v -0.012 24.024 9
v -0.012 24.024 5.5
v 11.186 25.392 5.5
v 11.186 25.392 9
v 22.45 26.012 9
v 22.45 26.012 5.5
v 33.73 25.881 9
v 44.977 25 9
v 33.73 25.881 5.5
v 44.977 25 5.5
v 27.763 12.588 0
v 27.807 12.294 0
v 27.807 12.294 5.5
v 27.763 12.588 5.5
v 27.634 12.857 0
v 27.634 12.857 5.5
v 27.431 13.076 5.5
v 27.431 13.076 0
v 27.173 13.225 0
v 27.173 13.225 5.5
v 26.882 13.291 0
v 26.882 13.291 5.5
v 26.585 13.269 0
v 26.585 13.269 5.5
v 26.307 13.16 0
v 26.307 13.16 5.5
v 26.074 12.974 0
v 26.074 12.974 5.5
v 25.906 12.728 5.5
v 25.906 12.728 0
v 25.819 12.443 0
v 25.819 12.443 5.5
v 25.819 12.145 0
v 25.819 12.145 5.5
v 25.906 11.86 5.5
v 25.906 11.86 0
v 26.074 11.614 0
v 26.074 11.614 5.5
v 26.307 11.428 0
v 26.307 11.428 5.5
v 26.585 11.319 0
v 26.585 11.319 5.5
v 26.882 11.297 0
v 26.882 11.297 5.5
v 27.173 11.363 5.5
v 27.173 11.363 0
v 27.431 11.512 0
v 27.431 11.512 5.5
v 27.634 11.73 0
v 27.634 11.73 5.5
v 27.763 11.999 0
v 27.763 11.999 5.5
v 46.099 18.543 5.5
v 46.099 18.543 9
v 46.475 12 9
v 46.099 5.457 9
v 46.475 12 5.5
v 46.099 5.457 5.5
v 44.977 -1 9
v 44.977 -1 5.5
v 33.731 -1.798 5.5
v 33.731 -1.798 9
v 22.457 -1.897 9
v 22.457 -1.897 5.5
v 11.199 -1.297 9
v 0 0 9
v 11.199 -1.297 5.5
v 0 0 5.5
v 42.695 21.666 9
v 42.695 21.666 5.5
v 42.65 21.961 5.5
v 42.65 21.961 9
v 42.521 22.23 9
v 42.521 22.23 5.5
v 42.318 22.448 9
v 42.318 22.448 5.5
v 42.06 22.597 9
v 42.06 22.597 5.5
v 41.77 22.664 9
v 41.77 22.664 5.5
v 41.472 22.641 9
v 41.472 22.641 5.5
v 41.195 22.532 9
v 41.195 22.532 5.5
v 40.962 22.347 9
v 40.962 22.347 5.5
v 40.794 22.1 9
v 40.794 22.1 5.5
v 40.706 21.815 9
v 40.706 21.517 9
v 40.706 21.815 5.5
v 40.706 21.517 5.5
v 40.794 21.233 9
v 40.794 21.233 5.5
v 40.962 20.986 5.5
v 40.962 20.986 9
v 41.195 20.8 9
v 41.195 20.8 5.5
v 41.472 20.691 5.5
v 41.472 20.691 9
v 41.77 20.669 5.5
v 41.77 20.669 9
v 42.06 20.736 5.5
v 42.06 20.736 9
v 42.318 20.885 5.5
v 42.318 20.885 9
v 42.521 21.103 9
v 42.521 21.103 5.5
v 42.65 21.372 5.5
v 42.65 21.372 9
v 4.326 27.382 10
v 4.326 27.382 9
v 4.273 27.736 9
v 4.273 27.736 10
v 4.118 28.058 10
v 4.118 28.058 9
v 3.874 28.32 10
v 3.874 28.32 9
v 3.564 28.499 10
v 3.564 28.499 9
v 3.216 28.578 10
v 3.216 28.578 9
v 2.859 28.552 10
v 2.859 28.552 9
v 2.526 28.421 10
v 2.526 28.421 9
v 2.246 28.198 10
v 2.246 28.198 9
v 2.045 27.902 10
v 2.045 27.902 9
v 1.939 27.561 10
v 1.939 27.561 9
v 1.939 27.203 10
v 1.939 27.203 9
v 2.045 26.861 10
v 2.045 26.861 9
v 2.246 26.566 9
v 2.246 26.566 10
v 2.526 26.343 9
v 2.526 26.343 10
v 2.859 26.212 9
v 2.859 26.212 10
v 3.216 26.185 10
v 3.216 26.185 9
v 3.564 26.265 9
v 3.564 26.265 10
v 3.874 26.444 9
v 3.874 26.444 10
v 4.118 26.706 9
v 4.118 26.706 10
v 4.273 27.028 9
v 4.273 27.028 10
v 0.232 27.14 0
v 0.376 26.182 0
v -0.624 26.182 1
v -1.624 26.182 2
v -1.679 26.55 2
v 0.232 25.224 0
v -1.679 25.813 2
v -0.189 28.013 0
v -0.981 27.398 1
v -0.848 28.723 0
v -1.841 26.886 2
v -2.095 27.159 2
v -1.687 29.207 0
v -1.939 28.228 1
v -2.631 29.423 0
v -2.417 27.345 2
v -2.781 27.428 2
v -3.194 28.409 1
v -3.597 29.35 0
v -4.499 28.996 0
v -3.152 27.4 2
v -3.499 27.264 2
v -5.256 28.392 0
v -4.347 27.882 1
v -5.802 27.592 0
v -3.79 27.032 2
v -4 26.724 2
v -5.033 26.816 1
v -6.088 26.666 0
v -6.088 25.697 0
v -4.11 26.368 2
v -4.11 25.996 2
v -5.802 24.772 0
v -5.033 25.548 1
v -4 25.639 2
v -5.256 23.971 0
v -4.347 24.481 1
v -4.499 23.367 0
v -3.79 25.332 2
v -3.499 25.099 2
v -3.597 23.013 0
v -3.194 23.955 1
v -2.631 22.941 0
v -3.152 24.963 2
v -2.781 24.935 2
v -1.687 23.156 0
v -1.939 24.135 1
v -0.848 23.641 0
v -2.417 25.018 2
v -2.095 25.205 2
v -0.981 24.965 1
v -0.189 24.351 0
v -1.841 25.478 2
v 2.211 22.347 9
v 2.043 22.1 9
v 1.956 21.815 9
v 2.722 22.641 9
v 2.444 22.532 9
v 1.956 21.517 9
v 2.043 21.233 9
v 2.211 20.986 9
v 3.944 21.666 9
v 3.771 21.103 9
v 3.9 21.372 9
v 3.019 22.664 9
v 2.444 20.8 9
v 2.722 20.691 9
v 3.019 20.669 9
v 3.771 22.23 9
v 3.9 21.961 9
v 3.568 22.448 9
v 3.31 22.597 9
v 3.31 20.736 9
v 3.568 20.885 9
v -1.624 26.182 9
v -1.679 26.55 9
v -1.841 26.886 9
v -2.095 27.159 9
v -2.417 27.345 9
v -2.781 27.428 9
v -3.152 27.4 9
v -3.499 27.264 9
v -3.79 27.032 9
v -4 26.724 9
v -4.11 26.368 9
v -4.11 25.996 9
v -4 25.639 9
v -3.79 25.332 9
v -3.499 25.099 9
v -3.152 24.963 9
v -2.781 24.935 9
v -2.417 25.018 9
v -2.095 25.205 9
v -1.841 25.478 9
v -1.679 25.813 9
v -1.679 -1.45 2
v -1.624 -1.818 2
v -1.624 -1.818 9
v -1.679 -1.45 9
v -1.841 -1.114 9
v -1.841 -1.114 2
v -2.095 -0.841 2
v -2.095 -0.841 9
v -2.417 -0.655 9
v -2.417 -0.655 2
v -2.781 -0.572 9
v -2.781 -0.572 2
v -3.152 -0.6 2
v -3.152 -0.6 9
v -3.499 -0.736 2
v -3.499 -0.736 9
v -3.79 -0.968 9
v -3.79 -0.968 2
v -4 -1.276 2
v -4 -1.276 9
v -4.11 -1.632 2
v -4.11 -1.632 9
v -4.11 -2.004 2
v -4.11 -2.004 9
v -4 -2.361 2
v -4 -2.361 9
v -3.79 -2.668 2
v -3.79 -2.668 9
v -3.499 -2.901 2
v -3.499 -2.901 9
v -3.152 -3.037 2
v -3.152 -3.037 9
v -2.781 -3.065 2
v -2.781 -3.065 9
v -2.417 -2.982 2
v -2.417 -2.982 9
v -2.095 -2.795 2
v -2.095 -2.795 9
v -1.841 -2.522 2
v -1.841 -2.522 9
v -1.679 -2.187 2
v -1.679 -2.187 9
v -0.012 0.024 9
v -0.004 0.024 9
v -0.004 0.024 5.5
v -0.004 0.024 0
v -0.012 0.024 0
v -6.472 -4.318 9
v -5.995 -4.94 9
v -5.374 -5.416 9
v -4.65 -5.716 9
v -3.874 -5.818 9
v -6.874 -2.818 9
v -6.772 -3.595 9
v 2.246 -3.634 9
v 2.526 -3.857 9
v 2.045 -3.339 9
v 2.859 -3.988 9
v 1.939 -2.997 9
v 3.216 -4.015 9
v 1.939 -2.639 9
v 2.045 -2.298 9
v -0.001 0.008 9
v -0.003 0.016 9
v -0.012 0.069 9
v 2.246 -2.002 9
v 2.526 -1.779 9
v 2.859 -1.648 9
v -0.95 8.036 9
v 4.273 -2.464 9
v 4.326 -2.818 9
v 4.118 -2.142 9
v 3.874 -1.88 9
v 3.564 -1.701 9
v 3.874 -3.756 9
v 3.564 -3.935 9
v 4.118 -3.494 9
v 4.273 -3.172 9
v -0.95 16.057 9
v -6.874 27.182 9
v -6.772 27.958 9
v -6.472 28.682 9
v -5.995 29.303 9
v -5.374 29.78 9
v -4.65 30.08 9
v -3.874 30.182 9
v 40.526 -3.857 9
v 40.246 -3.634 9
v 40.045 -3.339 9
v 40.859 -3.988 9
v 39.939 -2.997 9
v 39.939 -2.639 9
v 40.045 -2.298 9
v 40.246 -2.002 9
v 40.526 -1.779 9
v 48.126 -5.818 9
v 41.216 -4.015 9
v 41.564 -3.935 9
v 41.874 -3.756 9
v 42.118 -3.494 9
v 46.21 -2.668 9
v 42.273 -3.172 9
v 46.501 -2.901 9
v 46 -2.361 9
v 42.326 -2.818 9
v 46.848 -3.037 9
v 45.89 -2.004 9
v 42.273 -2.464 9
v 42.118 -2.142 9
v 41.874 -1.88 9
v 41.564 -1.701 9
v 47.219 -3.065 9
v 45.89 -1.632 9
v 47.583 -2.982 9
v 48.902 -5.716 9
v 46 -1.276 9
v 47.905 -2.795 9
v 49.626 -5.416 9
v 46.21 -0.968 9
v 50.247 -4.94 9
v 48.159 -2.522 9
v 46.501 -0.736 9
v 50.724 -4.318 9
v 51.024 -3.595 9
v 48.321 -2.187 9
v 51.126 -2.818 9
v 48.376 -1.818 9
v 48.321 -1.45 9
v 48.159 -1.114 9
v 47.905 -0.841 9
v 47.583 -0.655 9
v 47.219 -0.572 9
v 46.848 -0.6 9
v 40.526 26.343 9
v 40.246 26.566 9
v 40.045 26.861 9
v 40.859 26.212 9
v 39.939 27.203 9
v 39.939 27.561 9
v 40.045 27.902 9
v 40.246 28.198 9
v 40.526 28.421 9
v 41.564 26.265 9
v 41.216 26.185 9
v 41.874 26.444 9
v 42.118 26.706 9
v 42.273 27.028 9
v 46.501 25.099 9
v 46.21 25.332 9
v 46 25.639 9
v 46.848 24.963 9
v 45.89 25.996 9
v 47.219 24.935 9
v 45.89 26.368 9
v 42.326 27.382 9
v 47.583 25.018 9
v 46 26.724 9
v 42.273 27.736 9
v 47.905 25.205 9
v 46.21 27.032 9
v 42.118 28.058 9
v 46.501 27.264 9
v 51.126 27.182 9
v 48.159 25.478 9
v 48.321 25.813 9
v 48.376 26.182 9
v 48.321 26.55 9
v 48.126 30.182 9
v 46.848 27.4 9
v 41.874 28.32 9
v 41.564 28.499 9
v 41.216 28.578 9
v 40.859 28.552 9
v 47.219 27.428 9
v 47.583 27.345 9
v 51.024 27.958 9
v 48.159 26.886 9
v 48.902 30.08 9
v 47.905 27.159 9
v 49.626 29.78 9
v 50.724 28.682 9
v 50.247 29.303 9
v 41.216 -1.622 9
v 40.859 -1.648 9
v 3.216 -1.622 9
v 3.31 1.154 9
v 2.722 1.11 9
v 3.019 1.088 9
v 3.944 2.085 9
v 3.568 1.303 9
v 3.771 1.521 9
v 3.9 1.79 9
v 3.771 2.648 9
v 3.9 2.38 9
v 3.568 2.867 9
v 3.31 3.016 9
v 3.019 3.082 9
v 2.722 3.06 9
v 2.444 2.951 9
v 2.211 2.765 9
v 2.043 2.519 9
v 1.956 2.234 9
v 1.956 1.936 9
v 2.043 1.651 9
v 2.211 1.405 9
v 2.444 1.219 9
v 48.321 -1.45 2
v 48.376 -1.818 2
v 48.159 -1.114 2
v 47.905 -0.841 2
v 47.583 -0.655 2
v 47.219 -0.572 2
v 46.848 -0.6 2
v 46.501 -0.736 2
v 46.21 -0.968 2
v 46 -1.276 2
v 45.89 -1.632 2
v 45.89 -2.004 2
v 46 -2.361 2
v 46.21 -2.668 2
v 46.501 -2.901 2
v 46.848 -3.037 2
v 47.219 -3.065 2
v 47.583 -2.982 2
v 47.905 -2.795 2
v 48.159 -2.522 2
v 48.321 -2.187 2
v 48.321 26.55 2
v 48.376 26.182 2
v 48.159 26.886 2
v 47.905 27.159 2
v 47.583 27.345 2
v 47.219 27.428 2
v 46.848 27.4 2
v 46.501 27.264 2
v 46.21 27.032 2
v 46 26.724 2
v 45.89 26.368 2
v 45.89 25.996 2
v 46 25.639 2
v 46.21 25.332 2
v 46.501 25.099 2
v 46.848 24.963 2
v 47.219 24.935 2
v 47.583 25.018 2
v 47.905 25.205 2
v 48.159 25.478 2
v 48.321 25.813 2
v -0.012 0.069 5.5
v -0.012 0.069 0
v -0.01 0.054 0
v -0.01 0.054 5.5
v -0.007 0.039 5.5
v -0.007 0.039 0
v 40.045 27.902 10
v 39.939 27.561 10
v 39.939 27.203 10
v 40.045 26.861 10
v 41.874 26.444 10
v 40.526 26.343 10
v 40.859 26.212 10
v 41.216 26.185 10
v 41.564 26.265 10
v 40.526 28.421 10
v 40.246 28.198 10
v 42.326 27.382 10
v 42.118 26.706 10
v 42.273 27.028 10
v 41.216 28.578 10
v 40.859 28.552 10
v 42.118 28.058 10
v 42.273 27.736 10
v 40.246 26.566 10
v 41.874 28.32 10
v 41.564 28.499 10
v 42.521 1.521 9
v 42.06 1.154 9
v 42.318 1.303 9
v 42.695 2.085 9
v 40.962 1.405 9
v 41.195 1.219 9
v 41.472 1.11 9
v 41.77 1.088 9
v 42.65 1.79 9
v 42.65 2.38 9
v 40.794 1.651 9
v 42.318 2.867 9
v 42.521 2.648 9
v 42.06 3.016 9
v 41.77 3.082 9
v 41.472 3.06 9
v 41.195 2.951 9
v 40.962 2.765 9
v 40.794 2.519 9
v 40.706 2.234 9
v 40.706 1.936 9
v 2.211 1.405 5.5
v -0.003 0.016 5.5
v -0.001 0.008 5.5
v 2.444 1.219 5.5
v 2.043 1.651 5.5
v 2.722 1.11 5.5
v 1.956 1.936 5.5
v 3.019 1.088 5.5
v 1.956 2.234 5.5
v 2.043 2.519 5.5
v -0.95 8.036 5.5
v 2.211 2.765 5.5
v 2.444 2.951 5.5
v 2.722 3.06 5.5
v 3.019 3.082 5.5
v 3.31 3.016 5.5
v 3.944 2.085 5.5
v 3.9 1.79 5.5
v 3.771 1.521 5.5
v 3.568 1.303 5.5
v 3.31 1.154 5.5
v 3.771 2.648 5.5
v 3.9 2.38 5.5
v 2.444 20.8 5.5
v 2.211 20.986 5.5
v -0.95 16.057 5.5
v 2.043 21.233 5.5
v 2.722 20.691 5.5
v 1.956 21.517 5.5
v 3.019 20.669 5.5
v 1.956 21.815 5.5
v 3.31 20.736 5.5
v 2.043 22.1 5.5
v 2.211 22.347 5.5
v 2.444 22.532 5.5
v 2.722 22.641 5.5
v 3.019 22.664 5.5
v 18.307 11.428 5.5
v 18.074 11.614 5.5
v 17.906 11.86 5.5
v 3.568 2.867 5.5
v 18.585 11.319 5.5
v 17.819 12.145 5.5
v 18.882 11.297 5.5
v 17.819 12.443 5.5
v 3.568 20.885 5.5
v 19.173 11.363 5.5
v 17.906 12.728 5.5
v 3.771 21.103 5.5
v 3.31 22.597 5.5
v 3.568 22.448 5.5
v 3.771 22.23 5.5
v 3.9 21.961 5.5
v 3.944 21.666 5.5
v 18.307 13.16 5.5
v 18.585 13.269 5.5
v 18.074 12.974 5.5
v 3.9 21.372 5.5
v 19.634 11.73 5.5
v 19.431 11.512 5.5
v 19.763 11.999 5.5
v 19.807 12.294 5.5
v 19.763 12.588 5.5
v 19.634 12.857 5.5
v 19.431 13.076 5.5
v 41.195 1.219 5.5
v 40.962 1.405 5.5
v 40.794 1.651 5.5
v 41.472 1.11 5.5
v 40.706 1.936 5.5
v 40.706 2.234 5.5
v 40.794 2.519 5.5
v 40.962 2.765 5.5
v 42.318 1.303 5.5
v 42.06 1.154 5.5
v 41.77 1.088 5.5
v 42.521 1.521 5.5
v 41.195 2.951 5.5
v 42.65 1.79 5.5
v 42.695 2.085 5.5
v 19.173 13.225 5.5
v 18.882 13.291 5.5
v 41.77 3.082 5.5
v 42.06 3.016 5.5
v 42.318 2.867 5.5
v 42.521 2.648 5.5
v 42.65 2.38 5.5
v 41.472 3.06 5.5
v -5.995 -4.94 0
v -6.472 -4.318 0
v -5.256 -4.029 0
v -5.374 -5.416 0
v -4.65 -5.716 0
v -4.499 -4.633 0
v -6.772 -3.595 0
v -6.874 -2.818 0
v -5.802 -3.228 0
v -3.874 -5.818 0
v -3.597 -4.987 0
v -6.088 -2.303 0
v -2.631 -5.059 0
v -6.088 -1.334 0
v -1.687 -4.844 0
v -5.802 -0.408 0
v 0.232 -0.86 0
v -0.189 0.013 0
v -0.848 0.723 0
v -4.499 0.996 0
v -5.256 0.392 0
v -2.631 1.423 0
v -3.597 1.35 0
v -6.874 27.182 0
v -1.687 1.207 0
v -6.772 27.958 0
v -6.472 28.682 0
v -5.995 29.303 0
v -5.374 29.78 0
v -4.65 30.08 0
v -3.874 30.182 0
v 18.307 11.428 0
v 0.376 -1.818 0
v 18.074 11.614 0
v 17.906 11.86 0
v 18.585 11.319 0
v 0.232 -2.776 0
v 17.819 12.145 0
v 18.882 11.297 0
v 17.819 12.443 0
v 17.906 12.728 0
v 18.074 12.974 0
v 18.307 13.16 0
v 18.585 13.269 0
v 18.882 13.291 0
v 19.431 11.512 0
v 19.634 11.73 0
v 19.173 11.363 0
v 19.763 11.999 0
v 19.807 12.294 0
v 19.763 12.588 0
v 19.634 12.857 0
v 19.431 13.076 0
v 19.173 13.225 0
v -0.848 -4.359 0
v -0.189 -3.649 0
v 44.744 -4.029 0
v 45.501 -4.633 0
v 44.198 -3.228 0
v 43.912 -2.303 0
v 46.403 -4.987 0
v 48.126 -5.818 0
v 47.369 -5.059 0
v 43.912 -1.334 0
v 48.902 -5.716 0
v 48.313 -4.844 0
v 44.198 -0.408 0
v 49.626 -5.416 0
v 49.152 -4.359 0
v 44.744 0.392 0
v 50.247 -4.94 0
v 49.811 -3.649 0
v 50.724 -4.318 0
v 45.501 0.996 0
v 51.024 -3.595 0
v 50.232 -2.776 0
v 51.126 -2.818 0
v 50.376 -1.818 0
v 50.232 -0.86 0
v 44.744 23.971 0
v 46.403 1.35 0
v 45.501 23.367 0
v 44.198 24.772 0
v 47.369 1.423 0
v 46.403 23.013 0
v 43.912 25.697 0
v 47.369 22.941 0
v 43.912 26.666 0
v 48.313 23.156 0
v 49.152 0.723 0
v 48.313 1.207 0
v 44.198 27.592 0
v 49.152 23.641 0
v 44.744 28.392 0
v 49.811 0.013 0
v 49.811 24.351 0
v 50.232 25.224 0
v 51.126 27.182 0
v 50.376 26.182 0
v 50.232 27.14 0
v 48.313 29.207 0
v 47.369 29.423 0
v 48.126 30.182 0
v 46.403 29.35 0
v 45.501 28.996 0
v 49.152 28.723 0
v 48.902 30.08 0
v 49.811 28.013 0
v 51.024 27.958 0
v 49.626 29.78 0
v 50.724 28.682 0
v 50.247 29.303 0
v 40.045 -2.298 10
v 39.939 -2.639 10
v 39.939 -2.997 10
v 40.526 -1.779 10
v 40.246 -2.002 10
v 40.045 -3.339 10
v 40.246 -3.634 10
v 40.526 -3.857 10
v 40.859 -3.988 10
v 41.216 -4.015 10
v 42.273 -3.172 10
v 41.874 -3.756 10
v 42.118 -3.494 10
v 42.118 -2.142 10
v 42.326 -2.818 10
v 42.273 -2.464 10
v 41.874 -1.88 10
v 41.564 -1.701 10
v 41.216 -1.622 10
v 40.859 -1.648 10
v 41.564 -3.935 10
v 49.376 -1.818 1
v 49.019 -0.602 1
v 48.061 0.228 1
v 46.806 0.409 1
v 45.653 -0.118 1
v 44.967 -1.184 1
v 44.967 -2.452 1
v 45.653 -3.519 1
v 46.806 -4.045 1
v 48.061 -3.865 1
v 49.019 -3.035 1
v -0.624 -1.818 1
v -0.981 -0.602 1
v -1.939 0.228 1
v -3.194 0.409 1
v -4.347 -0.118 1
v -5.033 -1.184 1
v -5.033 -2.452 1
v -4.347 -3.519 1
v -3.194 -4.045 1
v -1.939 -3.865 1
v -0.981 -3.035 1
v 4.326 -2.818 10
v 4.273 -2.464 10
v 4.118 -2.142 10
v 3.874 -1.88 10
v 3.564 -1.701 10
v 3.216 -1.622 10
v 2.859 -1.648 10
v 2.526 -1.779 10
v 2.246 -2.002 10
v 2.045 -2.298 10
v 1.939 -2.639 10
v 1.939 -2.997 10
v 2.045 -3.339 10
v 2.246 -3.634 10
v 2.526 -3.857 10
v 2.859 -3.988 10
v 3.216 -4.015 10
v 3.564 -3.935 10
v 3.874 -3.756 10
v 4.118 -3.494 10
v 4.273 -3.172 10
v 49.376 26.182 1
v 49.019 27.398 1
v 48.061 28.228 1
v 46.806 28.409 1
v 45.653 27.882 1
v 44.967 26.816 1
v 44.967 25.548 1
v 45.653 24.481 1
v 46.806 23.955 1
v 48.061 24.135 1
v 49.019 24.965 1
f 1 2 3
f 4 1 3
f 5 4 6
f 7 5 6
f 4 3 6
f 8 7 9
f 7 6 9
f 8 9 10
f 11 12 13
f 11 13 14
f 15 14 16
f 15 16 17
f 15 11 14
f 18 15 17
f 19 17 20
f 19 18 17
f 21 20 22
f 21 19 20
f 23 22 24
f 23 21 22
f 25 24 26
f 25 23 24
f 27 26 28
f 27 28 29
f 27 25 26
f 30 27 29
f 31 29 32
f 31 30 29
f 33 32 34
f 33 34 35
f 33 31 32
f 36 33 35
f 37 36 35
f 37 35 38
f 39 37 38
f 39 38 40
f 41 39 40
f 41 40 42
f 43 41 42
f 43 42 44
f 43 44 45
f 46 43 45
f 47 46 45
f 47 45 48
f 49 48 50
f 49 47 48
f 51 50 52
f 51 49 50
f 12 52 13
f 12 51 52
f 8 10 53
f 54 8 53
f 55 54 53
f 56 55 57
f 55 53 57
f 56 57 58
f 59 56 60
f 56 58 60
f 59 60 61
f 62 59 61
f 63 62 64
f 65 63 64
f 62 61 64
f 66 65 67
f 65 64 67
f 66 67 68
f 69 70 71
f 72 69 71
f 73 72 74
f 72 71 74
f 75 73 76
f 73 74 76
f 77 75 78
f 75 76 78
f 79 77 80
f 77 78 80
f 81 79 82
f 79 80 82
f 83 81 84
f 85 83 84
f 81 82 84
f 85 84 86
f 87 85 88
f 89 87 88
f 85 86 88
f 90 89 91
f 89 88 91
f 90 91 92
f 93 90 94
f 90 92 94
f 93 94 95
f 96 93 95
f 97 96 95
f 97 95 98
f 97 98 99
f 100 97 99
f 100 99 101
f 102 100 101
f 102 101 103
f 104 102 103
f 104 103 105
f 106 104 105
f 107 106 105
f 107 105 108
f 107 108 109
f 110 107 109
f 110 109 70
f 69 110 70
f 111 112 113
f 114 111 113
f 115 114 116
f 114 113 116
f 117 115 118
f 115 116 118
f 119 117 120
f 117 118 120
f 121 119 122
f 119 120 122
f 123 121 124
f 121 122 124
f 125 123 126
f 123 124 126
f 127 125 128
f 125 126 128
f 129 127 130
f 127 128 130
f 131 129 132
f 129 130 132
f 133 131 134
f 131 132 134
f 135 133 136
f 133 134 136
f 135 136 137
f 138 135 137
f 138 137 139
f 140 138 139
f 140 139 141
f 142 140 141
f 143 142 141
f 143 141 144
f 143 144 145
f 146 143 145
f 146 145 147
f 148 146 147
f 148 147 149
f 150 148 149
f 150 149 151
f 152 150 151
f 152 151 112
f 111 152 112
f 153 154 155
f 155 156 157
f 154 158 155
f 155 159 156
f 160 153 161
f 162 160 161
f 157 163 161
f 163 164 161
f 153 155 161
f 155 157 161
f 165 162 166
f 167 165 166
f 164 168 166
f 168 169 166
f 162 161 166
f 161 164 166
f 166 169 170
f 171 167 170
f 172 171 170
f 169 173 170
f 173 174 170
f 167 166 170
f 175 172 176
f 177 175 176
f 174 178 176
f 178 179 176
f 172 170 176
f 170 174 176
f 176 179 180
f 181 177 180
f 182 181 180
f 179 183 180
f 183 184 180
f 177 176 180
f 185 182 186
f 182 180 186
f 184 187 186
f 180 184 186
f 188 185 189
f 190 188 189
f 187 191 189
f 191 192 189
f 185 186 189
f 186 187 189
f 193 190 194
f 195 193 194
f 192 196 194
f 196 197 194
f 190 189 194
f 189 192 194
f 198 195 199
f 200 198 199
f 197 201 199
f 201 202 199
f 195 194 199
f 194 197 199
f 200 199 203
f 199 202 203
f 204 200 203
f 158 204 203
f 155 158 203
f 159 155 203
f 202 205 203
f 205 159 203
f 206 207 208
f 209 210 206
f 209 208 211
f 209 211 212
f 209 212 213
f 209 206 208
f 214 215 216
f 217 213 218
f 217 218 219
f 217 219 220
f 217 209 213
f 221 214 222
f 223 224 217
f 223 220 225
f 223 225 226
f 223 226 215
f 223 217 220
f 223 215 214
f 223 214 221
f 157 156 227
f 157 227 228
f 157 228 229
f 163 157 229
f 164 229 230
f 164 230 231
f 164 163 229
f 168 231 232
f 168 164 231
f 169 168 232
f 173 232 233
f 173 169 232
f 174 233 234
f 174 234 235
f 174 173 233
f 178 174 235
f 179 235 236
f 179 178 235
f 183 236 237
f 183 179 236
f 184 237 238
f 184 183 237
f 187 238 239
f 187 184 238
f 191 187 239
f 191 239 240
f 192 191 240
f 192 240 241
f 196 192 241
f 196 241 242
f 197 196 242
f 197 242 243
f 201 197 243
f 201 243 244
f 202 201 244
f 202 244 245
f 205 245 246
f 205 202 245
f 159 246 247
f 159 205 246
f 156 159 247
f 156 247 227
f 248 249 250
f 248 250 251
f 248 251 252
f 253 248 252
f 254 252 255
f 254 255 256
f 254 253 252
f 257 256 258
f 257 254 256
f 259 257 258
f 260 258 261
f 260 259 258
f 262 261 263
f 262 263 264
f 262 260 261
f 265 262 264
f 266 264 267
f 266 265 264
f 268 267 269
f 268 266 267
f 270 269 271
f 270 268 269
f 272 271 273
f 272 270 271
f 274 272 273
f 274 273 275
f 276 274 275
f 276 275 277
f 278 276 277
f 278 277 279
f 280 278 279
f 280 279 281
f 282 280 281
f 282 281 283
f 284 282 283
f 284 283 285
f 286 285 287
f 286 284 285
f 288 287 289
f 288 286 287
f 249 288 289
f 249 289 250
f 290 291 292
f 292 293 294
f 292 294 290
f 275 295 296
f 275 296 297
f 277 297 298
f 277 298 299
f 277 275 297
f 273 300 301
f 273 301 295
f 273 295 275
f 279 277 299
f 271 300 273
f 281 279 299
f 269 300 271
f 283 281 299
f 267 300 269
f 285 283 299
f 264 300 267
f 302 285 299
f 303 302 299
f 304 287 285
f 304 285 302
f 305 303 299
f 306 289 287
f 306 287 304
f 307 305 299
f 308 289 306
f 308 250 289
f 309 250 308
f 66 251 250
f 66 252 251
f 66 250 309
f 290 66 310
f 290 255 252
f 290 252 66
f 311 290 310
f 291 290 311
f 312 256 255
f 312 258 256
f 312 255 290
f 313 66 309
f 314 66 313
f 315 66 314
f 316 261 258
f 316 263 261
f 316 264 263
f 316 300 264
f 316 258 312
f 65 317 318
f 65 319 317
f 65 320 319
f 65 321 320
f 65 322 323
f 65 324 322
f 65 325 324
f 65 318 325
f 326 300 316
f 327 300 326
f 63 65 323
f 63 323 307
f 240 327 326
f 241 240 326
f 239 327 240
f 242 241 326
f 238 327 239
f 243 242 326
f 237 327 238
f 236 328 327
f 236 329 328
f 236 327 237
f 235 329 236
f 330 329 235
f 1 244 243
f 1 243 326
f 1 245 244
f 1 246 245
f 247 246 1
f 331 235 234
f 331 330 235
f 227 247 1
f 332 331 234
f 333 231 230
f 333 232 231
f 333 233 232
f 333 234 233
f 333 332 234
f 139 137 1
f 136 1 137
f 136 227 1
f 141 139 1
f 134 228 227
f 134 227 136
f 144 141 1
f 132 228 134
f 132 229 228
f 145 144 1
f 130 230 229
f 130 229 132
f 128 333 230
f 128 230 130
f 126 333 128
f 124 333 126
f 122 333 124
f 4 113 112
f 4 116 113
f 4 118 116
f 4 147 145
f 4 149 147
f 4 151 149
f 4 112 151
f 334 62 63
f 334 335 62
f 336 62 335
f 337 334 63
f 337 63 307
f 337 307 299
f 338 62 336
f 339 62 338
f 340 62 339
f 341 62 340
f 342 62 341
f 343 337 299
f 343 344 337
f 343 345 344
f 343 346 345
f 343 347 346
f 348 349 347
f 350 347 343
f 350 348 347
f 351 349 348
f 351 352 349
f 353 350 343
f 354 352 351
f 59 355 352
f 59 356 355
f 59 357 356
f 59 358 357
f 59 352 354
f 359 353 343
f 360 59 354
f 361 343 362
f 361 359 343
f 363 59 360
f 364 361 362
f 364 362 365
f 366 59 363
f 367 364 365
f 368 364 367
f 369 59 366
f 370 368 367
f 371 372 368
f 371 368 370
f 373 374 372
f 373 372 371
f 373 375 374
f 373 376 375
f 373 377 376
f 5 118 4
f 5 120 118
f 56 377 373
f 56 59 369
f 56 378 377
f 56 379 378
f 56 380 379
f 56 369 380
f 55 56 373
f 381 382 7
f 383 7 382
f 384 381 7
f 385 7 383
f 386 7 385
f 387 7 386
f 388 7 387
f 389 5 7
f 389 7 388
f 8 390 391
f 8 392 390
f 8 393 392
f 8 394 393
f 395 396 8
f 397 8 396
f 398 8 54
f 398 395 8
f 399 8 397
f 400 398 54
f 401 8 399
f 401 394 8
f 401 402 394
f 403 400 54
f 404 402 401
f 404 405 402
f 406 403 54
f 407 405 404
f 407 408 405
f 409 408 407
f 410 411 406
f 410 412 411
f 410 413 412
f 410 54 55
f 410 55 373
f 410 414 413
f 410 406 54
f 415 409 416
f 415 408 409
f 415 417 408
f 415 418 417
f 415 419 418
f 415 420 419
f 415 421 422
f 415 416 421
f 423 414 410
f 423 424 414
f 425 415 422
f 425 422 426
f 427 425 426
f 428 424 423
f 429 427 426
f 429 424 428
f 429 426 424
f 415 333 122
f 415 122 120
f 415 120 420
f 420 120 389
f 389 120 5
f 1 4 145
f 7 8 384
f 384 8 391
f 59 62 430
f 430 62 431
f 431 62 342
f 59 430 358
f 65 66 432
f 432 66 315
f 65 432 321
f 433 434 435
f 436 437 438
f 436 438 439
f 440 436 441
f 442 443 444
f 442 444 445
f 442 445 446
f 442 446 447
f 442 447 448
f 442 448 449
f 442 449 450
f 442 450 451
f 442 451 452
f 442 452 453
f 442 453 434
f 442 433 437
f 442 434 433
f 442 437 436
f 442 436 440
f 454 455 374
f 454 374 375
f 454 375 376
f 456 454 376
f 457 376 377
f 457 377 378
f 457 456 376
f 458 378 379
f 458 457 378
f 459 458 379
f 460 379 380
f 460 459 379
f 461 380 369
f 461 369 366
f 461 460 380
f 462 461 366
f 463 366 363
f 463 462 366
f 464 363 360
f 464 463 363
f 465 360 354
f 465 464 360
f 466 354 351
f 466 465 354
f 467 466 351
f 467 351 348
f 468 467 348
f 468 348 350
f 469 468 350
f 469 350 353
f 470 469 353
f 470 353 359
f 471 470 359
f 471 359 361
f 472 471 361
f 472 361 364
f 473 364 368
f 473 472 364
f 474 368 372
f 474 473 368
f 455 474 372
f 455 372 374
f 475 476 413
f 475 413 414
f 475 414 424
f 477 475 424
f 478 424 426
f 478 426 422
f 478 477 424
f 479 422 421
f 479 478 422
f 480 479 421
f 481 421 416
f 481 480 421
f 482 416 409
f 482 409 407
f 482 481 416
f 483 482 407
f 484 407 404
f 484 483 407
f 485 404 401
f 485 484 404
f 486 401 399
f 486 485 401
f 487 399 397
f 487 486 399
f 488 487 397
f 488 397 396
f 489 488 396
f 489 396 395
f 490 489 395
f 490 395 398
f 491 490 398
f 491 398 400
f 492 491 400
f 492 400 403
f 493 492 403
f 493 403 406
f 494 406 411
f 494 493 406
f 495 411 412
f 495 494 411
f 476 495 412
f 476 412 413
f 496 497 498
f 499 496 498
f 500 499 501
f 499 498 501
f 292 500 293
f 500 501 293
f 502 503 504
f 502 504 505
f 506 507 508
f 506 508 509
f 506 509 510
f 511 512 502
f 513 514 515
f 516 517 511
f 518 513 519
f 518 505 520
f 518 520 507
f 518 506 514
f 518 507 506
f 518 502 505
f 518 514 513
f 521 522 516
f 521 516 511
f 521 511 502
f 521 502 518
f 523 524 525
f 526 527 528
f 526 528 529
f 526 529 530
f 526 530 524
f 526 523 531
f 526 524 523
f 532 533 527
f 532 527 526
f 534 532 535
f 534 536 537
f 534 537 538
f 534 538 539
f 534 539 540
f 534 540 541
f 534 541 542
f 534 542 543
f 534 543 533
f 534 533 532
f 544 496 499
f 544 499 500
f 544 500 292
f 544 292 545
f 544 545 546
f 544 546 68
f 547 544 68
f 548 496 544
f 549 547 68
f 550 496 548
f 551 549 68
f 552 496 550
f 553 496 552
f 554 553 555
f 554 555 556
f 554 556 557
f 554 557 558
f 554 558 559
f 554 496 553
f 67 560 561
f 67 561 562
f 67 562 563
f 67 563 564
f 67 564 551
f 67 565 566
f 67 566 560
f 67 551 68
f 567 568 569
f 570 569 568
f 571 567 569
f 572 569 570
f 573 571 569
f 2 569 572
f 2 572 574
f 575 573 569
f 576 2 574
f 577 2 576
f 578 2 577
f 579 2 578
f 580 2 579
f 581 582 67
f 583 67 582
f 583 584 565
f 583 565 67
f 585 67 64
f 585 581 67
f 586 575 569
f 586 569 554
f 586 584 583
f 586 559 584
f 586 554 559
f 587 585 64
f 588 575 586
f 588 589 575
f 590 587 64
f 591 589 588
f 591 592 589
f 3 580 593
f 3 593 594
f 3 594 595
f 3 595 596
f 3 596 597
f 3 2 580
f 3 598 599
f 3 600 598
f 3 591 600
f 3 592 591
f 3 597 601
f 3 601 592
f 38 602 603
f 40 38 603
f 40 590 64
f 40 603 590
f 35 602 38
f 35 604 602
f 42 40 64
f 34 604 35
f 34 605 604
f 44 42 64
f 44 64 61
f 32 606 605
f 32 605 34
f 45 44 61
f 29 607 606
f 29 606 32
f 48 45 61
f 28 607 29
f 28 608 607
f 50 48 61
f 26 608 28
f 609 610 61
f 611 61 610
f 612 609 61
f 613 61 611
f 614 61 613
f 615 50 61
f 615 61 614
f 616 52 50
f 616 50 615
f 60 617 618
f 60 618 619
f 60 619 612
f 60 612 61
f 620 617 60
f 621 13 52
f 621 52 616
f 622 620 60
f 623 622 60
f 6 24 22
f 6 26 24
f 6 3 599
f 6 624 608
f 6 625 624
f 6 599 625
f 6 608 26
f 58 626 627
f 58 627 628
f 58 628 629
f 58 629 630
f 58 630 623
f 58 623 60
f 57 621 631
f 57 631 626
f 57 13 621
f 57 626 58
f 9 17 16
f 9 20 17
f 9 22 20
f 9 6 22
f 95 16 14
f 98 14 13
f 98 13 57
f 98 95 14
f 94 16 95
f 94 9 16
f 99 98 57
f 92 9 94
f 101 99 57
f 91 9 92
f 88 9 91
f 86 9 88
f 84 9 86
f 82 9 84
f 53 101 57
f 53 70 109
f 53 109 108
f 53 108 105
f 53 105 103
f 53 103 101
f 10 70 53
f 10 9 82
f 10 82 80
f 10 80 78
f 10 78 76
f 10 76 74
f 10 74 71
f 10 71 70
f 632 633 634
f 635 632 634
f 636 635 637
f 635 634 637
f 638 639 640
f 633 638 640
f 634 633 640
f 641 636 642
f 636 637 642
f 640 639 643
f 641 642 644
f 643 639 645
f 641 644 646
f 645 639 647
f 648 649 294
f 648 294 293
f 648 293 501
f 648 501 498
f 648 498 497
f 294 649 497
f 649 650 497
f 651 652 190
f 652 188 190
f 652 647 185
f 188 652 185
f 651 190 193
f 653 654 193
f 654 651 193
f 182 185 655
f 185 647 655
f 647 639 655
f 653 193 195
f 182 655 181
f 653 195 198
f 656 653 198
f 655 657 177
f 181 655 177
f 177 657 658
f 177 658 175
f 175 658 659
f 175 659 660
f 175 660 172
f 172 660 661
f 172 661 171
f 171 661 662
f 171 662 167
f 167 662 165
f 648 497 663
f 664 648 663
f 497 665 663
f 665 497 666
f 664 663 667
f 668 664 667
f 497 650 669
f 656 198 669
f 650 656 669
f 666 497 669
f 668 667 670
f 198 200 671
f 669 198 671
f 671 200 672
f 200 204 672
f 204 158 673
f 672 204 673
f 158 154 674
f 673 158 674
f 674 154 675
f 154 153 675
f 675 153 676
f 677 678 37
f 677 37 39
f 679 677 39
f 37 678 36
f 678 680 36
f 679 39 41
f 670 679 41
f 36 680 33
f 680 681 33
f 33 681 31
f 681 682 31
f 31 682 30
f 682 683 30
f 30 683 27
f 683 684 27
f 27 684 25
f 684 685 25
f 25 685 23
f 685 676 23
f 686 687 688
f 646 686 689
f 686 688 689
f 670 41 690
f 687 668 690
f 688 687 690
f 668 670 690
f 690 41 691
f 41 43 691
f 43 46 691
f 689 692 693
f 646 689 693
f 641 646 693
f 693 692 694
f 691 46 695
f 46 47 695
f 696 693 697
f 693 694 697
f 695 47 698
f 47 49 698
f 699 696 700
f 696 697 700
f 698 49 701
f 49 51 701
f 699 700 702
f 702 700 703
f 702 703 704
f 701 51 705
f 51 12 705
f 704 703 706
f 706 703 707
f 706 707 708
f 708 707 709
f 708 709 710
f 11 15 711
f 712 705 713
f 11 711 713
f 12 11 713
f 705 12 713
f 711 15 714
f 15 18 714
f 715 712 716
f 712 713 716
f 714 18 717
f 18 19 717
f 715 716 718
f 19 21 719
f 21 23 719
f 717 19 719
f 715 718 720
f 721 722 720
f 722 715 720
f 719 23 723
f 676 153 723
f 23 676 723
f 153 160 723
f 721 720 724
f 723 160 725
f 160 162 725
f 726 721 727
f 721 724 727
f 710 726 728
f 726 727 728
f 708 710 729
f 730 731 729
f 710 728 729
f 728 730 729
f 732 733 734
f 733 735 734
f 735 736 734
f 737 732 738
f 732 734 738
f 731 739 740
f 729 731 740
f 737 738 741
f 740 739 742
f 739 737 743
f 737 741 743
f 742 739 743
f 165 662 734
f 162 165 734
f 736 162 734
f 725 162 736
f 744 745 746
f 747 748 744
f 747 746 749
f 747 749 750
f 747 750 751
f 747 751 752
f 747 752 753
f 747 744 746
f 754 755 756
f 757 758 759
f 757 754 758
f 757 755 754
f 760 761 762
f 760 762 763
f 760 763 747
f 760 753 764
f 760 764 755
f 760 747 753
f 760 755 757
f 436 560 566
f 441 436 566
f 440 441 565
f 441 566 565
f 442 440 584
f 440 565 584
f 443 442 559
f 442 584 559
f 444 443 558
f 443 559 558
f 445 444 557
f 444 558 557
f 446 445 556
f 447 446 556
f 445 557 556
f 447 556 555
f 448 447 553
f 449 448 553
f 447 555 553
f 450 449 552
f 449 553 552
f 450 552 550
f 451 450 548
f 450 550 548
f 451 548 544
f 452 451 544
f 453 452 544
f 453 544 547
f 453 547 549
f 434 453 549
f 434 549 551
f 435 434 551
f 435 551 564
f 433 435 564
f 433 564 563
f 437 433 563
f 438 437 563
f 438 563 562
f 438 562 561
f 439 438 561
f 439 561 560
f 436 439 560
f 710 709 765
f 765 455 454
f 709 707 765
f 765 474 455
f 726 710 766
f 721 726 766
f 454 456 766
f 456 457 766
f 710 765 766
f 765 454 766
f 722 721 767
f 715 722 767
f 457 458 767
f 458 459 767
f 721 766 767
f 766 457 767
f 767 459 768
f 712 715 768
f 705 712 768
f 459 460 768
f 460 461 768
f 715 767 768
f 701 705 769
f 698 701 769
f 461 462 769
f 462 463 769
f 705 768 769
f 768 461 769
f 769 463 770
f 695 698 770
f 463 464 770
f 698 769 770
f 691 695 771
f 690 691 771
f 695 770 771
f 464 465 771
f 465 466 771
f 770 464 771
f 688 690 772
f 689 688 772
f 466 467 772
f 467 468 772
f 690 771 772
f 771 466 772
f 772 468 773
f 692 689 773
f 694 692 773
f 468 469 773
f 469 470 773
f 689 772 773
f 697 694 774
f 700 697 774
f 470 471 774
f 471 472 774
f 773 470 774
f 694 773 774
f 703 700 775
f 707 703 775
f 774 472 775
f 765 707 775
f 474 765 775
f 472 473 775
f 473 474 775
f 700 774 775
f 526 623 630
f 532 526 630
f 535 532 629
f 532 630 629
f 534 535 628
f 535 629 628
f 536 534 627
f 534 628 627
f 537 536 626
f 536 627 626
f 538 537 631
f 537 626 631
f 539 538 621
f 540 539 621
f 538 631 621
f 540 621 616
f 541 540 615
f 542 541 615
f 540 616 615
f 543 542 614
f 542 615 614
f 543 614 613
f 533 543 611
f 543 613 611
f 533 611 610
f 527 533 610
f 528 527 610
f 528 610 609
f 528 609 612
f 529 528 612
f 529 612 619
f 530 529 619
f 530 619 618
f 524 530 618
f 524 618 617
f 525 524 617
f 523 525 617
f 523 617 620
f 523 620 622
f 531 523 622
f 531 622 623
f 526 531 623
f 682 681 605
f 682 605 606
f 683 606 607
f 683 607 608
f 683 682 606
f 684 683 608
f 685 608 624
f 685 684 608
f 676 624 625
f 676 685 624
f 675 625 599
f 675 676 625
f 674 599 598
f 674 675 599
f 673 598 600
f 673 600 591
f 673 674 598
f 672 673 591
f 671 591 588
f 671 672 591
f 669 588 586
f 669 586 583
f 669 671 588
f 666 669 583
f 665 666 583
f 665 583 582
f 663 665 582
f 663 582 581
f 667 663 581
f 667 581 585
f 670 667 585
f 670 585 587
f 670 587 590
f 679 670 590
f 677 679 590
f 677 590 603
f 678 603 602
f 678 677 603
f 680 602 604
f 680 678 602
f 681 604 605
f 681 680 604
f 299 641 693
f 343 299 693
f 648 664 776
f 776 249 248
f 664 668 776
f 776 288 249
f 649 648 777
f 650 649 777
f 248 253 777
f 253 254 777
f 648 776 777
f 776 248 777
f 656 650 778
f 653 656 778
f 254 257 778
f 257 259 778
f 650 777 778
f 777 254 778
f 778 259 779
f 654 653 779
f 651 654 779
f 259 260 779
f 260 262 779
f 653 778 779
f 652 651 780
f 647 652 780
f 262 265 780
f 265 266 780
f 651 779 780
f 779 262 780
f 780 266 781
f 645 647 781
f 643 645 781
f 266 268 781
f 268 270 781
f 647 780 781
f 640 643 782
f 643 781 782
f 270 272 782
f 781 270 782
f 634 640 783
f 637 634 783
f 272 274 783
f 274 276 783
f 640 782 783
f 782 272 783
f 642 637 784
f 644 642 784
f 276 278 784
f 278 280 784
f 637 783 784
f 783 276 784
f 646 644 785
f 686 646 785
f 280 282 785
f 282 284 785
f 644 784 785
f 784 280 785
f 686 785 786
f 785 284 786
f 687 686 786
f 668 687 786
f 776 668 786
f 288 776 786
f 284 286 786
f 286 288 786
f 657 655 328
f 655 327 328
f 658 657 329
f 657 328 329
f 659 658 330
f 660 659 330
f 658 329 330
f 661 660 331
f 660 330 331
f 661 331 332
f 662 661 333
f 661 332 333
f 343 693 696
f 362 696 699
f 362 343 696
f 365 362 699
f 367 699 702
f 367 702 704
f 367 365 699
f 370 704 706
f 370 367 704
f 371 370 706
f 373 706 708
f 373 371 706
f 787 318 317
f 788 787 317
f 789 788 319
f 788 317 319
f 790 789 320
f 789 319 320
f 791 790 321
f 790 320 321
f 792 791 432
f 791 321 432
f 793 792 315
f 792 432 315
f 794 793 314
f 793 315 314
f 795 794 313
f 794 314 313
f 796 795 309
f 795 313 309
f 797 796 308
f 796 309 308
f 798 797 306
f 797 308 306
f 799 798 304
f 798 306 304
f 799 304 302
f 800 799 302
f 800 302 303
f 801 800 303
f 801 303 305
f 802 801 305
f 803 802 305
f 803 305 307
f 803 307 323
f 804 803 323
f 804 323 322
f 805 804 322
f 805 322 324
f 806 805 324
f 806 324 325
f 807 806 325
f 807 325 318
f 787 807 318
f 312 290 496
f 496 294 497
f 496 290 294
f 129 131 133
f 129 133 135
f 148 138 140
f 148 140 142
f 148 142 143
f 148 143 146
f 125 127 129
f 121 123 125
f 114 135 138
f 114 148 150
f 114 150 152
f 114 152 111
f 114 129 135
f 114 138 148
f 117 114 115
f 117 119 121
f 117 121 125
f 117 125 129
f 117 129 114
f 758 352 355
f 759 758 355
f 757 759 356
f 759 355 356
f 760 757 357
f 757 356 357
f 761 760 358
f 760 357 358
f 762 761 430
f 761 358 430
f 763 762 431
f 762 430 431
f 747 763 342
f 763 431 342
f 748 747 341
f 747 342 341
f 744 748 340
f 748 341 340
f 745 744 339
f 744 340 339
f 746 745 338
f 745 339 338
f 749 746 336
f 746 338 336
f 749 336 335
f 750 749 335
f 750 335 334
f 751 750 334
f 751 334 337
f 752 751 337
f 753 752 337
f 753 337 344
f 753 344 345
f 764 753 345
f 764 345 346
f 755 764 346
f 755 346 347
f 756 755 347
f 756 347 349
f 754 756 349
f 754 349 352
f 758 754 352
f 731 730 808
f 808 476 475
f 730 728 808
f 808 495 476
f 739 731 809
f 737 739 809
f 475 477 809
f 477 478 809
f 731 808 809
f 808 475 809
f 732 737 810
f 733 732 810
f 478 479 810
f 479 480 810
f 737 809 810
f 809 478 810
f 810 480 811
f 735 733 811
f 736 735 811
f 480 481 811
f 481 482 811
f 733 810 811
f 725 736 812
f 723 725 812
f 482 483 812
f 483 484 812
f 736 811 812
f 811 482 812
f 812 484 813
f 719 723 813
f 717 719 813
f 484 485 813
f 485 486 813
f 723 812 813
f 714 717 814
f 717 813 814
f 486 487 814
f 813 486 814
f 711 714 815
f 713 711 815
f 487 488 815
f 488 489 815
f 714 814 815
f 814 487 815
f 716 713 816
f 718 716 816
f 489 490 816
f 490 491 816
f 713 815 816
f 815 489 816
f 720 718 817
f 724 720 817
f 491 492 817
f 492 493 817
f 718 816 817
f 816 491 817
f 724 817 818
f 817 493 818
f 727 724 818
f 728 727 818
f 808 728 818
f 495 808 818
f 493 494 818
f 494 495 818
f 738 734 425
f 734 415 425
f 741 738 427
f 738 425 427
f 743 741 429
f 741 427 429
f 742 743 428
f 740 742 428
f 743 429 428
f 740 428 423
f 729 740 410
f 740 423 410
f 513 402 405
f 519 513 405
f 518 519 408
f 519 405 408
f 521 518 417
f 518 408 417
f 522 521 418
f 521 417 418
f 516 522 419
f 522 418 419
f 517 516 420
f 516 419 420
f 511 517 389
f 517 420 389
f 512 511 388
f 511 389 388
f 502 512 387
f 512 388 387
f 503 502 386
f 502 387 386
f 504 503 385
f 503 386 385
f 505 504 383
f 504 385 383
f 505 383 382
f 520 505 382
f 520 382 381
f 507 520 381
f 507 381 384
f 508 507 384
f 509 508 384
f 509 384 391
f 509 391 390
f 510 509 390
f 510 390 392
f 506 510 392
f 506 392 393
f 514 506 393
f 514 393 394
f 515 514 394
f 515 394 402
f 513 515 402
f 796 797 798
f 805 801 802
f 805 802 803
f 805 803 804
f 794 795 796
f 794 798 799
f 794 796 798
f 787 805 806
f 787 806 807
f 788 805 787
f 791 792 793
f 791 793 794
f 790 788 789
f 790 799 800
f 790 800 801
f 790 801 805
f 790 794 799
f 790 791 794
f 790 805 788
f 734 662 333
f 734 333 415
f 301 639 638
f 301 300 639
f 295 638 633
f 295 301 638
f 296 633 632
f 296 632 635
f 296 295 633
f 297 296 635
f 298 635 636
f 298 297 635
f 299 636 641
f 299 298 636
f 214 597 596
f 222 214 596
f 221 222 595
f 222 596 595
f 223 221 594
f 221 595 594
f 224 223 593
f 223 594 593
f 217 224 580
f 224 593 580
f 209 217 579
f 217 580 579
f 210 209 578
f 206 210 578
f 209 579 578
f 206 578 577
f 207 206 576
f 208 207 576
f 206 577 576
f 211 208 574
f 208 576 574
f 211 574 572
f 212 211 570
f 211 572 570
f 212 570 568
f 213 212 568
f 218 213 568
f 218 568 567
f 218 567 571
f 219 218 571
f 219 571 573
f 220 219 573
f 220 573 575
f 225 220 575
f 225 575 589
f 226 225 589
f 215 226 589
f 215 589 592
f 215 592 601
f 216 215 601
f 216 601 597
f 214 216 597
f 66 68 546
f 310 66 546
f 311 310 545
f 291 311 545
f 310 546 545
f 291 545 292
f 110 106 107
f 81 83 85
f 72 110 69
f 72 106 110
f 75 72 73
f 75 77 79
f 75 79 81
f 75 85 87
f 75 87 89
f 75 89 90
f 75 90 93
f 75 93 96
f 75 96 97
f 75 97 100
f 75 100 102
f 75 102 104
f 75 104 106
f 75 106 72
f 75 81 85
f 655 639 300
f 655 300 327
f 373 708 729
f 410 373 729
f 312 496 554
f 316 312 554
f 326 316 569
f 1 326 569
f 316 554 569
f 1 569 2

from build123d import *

# Parameters (mm, degrees)
F0_W     = 58
F0_H     = 36
F0_R     = 1.25
F0_R_2   = 1.2
F1_DEPTH = 9
F0_R_3   = 1
F2_DEPTH = 5.5
F3_DEPTH = 9
F4_R     = 3
F5_SIZE  = 2
F6_DEPTH = 10


with BuildPart() as f1:
    # F0 (on Top) → F1 (new body)
    with BuildSketch(Plane.XY):
        with Locations((22.1260370687, 12.181818096)):
            Rectangle(F0_W, F0_H)
        with Locations((-2.8739629313, -1.818181904)):
            Circle(F0_R, mode=Mode.SUBTRACT)
        with Locations((3.1260370687, -2.818181904)):
            Circle(F0_R_2, mode=Mode.SUBTRACT)
        with Locations((41.1260370687, -2.818181904)):
            Circle(F0_R_2, mode=Mode.SUBTRACT)
        with Locations((47.1260370687, -1.818181904)):
            Circle(F0_R, mode=Mode.SUBTRACT)
        with BuildLine():
            Line((-0.0042433119, 0.0237876128), (-0.0123524841, 0.02397218))
            Line((-0.0123524841, 0.02397218), (-0.0123524841, 0.0693824727))
            ThreePointArc((-0.0123524841, 0.0693824727), (-1.0671188126, 12.0466773263), (-0.0123524841, 24.02397218))
            ThreePointArc((-0.0123524841, 24.02397218), (22.4498159336, 26.0118318189), (44.9770614896, 25))
            ThreePointArc((44.9770614896, 25), (46.474513746, 12), (44.9770614896, -1))
            ThreePointArc((44.9770614896, -1), (22.4574664967, -1.8971785964), (0, 0))
            ThreePointArc((0, 0), (-0.0021227043, 0.0118936194), (-0.0042433119, 0.0237876128))
        make_face(mode=Mode.SUBTRACT)
        with Locations((-2.8739629313, 26.181818096)):
            Circle(F0_R, mode=Mode.SUBTRACT)
        with Locations((3.1260370687, 27.381818096)):
            Circle(F0_R_2, mode=Mode.SUBTRACT)
        with Locations((41.1260370687, 27.381818096)):
            Circle(F0_R_2, mode=Mode.SUBTRACT)
        with Locations((47.1260370687, 26.181818096)):
            Circle(F0_R, mode=Mode.SUBTRACT)
    extrude(amount=F1_DEPTH)

    # F0 (on Top) → F2 (join)
    with BuildSketch(Plane.XY):
        with BuildLine():
            Line((-0.0123524841, 24.02397218), (-0.0123524841, 0.0693824727))
            ThreePointArc((-0.0123524841, 0.0693824727), (-0.0083017494, 0.0465843578), (-0.0042433119, 0.0237876128))
            Line((-0.0042433119, 0.0237876128), (44.9770614896, -1))
            Line((44.9770614896, -1), (44.9770614896, 25))
            Line((44.9770614896, 25), (-0.0123524841, 24.02397218))
        make_face()
        with Locations((2.9444331303, 2.0848012064)):
            Circle(F0_R_3, mode=Mode.SUBTRACT)
        with Locations((41.6948273778, 2.0848012064)):
            Circle(F0_R_3, mode=Mode.SUBTRACT)
        with Locations((18.8074270263, 12.2937392443)):
            Circle(F0_R_3, mode=Mode.SUBTRACT)
        with Locations((2.9444331303, 21.6664075851)):
            Circle(F0_R_3, mode=Mode.SUBTRACT)
        with Locations((26.8074270263, 12.2937392443)):
            Circle(F0_R_3, mode=Mode.SUBTRACT)
        with Locations((41.6948273778, 21.6664075851)):
            Circle(F0_R_3, mode=Mode.SUBTRACT)
        with Locations((2.9444331303, 21.6664075851)):
            Circle(F0_R_3)
        with Locations((2.9444331303, 2.0848012064)):
            Circle(F0_R_3)
        with Locations((41.6948273778, 2.0848012064)):
            Circle(F0_R_3)
        with Locations((41.6948273778, 21.6664075851)):
            Circle(F0_R_3)
        with BuildLine():
            ThreePointArc((44.9770614896, 25), (22.4498159336, 26.0118318189), (-0.0123524841, 24.02397218))
            Line((-0.0123524841, 24.02397218), (44.9770614896, 25))
        make_face()
        with BuildLine():
            Line((44.9770614896, -1), (-0.0042433119, 0.0237876128))
            ThreePointArc((-0.0042433119, 0.0237876128), (-0.0021227043, 0.0118936194), (0, 0))
            ThreePointArc((0, 0), (22.4574664967, -1.8971785964), (44.9770614896, -1))
        make_face()
        with BuildLine():
            Line((44.9770614896, 25), (44.9770614896, -1))
            ThreePointArc((44.9770614896, -1), (46.474513746, 12), (44.9770614896, 25))
        make_face()
        with BuildLine():
            ThreePointArc((-0.0123524841, 24.02397218), (-1.0671188126, 12.0466773263), (-0.0123524841, 0.0693824727))
            Line((-0.0123524841, 0.0693824727), (-0.0123524841, 24.02397218))
        make_face()
    extrude(amount=F2_DEPTH)

    # F0 (on Top) → F3 (join)
    with BuildSketch(Plane.XY):
        with Locations((41.6948273778, 21.6664075851)):
            Circle(F0_R_3)
        with Locations((2.9444331303, 21.6664075851)):
            Circle(F0_R_3)
        with Locations((2.9444331303, 2.0848012064)):
            Circle(F0_R_3)
        with Locations((41.6948273778, 2.0848012064)):
            Circle(F0_R_3)
    extrude(amount=F3_DEPTH)

    # F4
    f4_edges = [f1.edges().sort_by_distance(p)[0] for p in [
        (51.126037, 30.181818, 4.5),
        (51.126037, -5.818182, 4.5),
        (-6.873963, -5.818182, 4.5),
        (-6.873963, 30.181818, 4.5),
    ]]
    fillet(f4_edges, radius=F4_R)

    # F5
    f5_edges = [f1.edges().sort_by_distance(p)[0] for p in [
        (-4.123963, -1.818182, 0),
        (-4.123963, 26.181818, 0),
        (45.876037, -1.818182, 0),
        (45.876037, 26.181818, 0),
    ]]
    chamfer(f5_edges, length=F5_SIZE)

    # F0 (on Top) → F6 (join)
    with BuildSketch(Plane.XY):
        with Locations((3.1260370687, 27.381818096)):
            Circle(F0_R_2)
        with Locations((3.1260370687, -2.818181904)):
            Circle(F0_R_2)
        with Locations((41.1260370687, -2.818181904)):
            Circle(F0_R_2)
        with Locations((41.1260370687, 27.381818096)):
            Circle(F0_R_2)
    extrude(amount=F6_DEPTH)


solid = f1.part
